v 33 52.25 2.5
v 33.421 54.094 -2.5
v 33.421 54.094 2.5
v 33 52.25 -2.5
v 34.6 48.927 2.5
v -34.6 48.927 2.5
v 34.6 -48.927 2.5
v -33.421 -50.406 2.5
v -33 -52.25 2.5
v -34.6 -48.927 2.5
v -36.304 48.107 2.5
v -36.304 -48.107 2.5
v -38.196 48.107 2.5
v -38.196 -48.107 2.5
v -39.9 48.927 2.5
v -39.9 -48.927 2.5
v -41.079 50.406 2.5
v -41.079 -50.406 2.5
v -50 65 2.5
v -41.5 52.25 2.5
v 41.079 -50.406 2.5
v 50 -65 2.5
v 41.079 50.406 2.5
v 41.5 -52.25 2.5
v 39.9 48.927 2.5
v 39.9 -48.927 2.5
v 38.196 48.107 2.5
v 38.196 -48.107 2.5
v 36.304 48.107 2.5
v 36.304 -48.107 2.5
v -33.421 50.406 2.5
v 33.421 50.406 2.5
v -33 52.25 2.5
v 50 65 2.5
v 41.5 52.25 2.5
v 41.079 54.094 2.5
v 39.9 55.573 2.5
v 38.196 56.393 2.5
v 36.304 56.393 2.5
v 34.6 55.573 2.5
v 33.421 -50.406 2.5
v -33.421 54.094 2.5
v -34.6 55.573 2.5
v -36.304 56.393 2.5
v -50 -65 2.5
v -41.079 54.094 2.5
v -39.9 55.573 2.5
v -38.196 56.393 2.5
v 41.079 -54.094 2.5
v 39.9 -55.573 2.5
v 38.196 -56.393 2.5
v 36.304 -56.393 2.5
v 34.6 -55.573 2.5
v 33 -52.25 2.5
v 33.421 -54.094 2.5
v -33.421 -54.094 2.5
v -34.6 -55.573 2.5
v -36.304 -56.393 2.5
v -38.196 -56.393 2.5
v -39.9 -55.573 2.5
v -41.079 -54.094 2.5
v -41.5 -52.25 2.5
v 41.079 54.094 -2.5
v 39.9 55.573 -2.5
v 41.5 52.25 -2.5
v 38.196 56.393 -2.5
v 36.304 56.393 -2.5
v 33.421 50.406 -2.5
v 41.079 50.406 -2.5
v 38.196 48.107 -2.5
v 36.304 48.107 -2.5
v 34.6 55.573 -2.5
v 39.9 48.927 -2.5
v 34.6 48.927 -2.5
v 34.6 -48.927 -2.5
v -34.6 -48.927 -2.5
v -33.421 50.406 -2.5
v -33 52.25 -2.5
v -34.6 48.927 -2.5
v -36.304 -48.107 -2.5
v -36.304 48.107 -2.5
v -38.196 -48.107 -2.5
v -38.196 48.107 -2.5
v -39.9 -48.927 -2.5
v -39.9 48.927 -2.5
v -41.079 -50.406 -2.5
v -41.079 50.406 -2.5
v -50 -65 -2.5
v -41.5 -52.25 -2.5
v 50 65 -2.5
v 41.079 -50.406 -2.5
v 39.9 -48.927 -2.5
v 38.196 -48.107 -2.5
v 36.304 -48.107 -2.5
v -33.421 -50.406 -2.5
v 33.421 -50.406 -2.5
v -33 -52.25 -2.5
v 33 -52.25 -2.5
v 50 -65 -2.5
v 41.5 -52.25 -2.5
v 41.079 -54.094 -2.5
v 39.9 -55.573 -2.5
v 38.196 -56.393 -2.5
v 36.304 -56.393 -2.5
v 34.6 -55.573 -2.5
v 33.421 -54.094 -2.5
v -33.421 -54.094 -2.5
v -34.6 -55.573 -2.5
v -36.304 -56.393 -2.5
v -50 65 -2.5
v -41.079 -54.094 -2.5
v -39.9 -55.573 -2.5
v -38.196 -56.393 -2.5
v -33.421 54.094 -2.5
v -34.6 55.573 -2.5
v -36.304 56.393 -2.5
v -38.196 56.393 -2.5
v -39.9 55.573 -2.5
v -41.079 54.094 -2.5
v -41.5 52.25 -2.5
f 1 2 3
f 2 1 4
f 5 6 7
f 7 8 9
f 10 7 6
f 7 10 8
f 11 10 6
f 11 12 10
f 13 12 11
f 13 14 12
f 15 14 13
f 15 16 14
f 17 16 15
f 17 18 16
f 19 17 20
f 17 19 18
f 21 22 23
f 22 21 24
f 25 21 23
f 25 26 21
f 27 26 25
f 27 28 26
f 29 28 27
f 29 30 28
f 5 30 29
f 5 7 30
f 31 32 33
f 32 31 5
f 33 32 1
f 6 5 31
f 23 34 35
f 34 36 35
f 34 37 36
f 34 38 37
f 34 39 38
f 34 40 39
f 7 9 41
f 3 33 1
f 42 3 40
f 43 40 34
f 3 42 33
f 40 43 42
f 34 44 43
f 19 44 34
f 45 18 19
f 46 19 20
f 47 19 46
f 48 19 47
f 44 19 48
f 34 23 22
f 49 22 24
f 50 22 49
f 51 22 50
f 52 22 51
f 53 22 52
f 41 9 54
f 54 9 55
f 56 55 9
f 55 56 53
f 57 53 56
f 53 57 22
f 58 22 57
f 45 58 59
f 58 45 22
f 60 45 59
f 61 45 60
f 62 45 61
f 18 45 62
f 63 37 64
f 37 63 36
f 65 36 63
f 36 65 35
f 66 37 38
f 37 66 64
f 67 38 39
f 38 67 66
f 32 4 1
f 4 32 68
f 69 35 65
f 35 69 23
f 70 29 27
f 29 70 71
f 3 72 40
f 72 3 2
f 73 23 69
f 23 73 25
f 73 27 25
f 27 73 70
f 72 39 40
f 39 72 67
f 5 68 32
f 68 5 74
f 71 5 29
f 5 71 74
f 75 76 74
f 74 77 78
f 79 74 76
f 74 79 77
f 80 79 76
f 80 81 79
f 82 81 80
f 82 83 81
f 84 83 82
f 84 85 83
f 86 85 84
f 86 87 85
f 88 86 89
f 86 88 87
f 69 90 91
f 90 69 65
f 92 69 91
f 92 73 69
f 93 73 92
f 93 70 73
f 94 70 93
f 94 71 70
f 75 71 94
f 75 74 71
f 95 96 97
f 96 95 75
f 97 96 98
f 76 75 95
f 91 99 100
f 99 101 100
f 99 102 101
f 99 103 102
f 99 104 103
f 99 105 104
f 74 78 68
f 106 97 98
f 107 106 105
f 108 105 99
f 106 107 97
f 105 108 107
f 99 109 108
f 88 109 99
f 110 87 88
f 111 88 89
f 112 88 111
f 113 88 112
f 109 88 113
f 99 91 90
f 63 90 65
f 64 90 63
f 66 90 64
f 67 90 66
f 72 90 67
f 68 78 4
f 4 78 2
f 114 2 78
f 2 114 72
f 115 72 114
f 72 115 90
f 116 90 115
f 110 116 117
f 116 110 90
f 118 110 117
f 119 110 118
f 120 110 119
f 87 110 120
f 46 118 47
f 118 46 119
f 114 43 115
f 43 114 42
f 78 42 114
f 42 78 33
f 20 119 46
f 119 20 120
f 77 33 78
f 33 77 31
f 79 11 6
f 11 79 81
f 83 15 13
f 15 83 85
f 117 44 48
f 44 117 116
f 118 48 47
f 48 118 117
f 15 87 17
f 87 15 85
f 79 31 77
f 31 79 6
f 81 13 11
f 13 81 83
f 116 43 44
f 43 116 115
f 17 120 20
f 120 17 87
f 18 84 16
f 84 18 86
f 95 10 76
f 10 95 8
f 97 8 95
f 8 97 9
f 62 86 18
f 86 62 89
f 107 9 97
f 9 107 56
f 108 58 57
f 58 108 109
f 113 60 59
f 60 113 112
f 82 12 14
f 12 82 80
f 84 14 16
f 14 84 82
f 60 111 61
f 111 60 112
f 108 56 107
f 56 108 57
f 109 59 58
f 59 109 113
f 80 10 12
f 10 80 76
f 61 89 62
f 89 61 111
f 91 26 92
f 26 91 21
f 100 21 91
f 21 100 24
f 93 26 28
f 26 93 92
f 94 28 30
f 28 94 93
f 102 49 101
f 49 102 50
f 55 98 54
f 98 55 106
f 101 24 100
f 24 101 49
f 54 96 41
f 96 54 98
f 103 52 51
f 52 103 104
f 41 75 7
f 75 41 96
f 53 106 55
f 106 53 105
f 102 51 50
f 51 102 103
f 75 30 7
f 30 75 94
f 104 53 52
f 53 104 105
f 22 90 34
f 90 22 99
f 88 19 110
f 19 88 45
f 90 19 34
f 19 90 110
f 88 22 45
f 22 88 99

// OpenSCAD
// Generated by SolidPython 1.1.3 on 2024-03-13 11:53:13


difference() {
	cube(center = true, size = [100, 130.0000000000, 5]);
	union() {
		translate(v = [37.2500000000, 52.2500000000]) {
			cylinder(center = true, h = 5, r = 4.2500000000);
		}
		translate(v = [-37.2500000000, 52.2500000000]) {
			cylinder(center = true, h = 5, r = 4.2500000000);
		}
		translate(v = [-37.2500000000, -52.2500000000]) {
			cylinder(center = true, h = 5, r = 4.2500000000);
		}
		translate(v = [37.2500000000, -52.2500000000]) {
			cylinder(center = true, h = 5, r = 4.2500000000);
		}
	}
}
/***********************************************
*********      SolidPython code:      **********
************************************************
 
import solid
import numpy as np
import numbers
import pudb
from solid.utils import *
import viewscad
import subprocess
import os
import os.path as osp
import math
import sys

chamfer_extrude=solid.import_scad("./chamfer_extrude.scad")
chamfer_extrude=chamfer_extrude.chamfer_extrude
r = viewscad.Renderer(width=800, height=800)

def debug(model,f_name,path="/home/ts/code/projects/mfd/designs/debug"):
    solid.scad_render_to_file(model,osp.join(path,f_name)+".scad")
#generate position list of wells using offset from center
wells_pos_from_center_4 = lambda offset: [[-offset,offset],
                                        [offset, offset],
                                        [-offset, -offset],
                                        [offset, -offset]]
wells_pos_from_center_2 = lambda offset: [[offset,0],
                                        [-offset,0]]

def make_well(dims,shape=None,height=None,dxf=False):
    def circle_cylinder():
        if dxf or (height is None):
            well = solid.circle(r=dims, segments=64)
        else:
            well = solid.cylinder(r=dims, h=height, segments=64, center = True)
        return well
    if dims is None:
        sys.exit("radius needs to be a number")
    if isinstance(dims, numbers.Number):
        well =circle_cylinder()
    elif len(dims)==1:
        if isinstance(dims[1], numbers.Number):
            well =circle_cylinder()
        else:
            sys.exit("radius needs to be a number")
    elif len(dims)==2:
        well = solid.square(dims,center = True)
    elif len(dims)==3:
        well = solid.cube(dims, center = True)
    return well

def wells_top_bottom(center_gap,device_dims=None,shape=None,height=None, positions = None, dxf = False,well_shape=None):
    if well_shape == None:
        well_shape = make_well(device_dims,shape=shape,height=height,dxf=dxf)
    wells = []
    if positions is None:
        offset = radius+radius/2.0
        positions = wells_pos_from_center_2(offset)
    if dxf or (height is None):
        height = 0
    for position in positions:
        if dxf:
            wells.append(solid.translate([position[0],position[1]])(well_shape))
        else:
            wells.append(solid.translate([position[0],position[1],height/2.0])(well_shape))
    return  union()(*wells)

#place wells in four corners 
def four_corner(radius,height=None, positions = None, dxf = False):
    #if well pos not specified set
    #to equally spaced by half radius
    if positions is None:
        offset = radius+radius/2.0
        positions = wells_pos_from_center_4(offset)
    if dxf or (height is None):
        height = 0
    #make wells at positions with specified radius and height
    wells = []
    for position in positions:
        #make circle if making dxf
        if dxf:
            well_shape = solid.circle(r=radius, segments=64)
            well_shape = solid.translate([position[0],position[1]])(well_shape)
        #if stl make cylinder
        else:
            well_shape = solid.cylinder(r=radius, h=height, segments=64, center = True)
            well_shape = solid.translate([position[0],position[1],height/2.0])(well_shape)
        wells.append(well_shape)
    return  union()(*wells)

#generate channels 
def make_channels(length,width,height=0,num_chans=1,max_chans=None,spacing=None, dxf = False,
                  rotate_channels=False):
    if dxf or (height is None):
        height = 0
    #if channel gap not defined, is equal to
    if spacing is None: spacing = width
    #calculate number of channels if fitting max num within given width
    if not max_chans is None:
        import math
        num_chans = math.floor((max_chans-spacing)/(width+spacing))
    #get total width of channel section  
    total_width = (width*num_chans)+(spacing*(num_chans-1))

    #make template channel
    #if rotate_channels: width, length = length, width
    if dxf:
        channel_t = solid.square([length,width],center = True)
    else:
        channel_t = solid.cube([length,width,height], center = True)

    #if number channels is even, offset the first channel to center its gap
    if num_chans % 2 == 0: centering = -(width/2.0+spacing/2.0)
    else: centering = 0
    #move template channel up to align bottom at z = 0 
    #and offset center if necessary
    if dxf:
        channel_t = solid.translate([0,centering])(channel_t)
    else:
        channel_t = solid.translate([0,centering,height/2.0])(channel_t)

    #if rotate_channels: length,width = width,length
    #start making the channels
    channels = []
    for i in range(num_chans):
        #if i=0 there is no translation
        #if i=1, we make the first channel adjacent to second
        direction = i

        #if i>=1, we add channels alternating left and right
        if i >= 1:
            direction = -(i/2.0)
            if i % 2 == 1: direction = (-direction)+0.5
                
        #make channel at right position and add it to channel list
        translation_coords = [0,direction*(width+spacing)]
        #if rotate_channels: translation_coords = [direction*(width+spacing),0]
        if dxf:
            channel = solid.translate(translation_coords)(channel_t)
        else:
            channel = solid.translate([*translation_coords,0])(channel_t)
        channels.append(channel)
    
    #group all channels as one object
    channels = union()(*channels)
    #compute the x,y,z dimensions in order to pass as arguments 
    #for construction of other parts of device (such as the chambers)
    measurements = {'x':(length/2.0,-length/2.0),
                    'y':(total_width/2.0,-total_width/2.0)}
    if not dxf:
        measurements['z'] = (height,0)
    if rotate_channels:
        channels = solid.rotate(90)(channels)
        measurements['x'],measurements['y']=measurements['y'],measurements['x']
    return channels,measurements

def make_chambers(msrs,height=None,extra=0,len_until=None,width=None, dxf = False):
    #computes x,y,z length
    total = lambda x : abs(x[0]) + abs(x[1])
    
    #if specific height if specified
    #otherwise use same height as channels
    if dxf:
        pass
    elif not height is None:
        msrs['z'] = (height,0)
    else:
        msrs['z'] = (0,0)
        
    #make copy of measurements from channels to modify chamber dimensions 
    #and add length to chambers as specified
    chamber_dims = msrs.copy()
    #calculate length of chamber to reach specified offset
    if not len_until is None:
        chamber_len = len_until-(msrs['x'][0])
    #or add specified length to channel length (if not specified, adds 0)
    else:
        chamber_len = msrs['x'][0]+extra
    #set the chamber length based 
    chamber_dims['x'] = (chamber_len/2.0,-(chamber_len/2.0))
    #compute final dimensions of chamber
    if not width is None:
        chamber_dims['y'] = (width/2.0,-width/2.0)
    chamber_dims = [total(size) for size in chamber_dims.values()]
        
    #calculate chamber translation offset to place adjacent to channels
    chamber_trslt = msrs['x'][0]+(chamber_len/2.0)
    #compute chamber translation coordinates to align with channels
    #x = 1 moves chamber above channels
    #x = -1 moves chamber below channels
    if dxf:
        trslt = lambda x : [x*(chamber_trslt),0]
    else:
        trslt = lambda x : [x*(chamber_trslt),0,msrs['z'][0]/2.0]
    
    #function to make chamber at top or at bottom 
    if dxf:
        move = lambda x : solid.translate(trslt(x))(solid.square(chamber_dims, center = True) )
    else:
        move = lambda x : solid.translate(trslt(x))(solid.cube(chamber_dims,center = True))
    #make top and bottom chambers and return them as grouped
    top = move(1)
    bottom = move(-1)
    #chambers=solid.rotate(90)(solid.union()(top,bottom))
    chambers=(solid.union()(top,bottom))

    return chambers

#create alignment features 
def alignment_features(unit,dims,grid_size, mask_size = None, alignment = "hollow", units_from_center = (2.5,2.5), corner_len=None):
    width = grid_size[0]*dims[0]
    length = grid_size[1]*dims[1]
    if mask_size is None and corner_len is None:
        corner_len = (dims[0] + dims[1]) /2 / 8
    corner = lambda thickness_div : solid.union()( solid.square([corner_len,corner_len/thickness_div],center=False), solid.square([corner_len/thickness_div,corner_len],center=False) )
    
    def make_full(thickness_div):
        thickness = corner_len/thickness_div
        tr = solid.translate([0, 0, 0 ])(solid.rotate(180)(corner(thickness_div)))
        tr = solid.translate([thickness/2,thickness/2,0])(tr)
        bl = solid.translate([0, 0, 0 ])(solid.rotate(0)(corner(thickness_div)))
        bl = solid.translate([-thickness/2,-thickness/2,0])(bl)
        return solid.union()(tr,bl)
    
    def make_hollow(thickness_div):
        thickness = corner_len/(thickness_div/2)
        inner = make_full(thickness_div)
        outer = make_full(thickness_div/2)
        hollow = outer - inner 
        return hollow
    
    center = (width /2 , length/2)
    mask_pos = lambda x,y : (center[0] + x*(float(units_from_center[0])*dims[0]), center[1] + y*(float(units_from_center[1])*dims[1]))
    positions = []
    positions.append(mask_pos(1,0))
    positions.append(mask_pos(0,1))
    positions.append(mask_pos(-1,0))
    positions.append(mask_pos(0,-1))
    make_mask = lambda mtype : make_hollow(8) if mtype == "hollow" else make_full(8)
    masks = [ solid.translate([*position,0])(make_mask(alignment)) for position in positions]
    
    solid.scad_render_to_file(solid.union()(*masks),"./designs/open_chamber/masks.scad")
    #return unit - solid.union()(*masks)
    return solid.union()(*masks,unit)

def create_outline(thickness, array, dims, grid_size,):
    width = grid_size[0]*dims[0] + thickness *2
    length = grid_size[1]*dims[1] + thickness *2
    outer = solid.translate([-thickness, -thickness,0])(solid.square([width, length]))
    return outer-array

def create_wall(wall_thickness, outline_thickness, dims, grid_size, wall_height = 2000, dxf = False):
    inner_width = grid_size[0]*dims[0] + outline_thickness *2
    inner_length = grid_size[1]*dims[1] + outline_thickness *2
    outer_width = inner_width + wall_thickness * 2
    outer_length = inner_length + wall_thickness * 2
    outer_pos_x = -outline_thickness-wall_thickness
    outer_pos_y = -outline_thickness-wall_thickness
    inner_pos_x = -outline_thickness
    inner_pos_y = -outline_thickness
    if dxf:
        inner_wall = solid.translate([inner_pos_x,
                                      inner_pos_y,
                                      0])(solid.square([inner_width, inner_length]))
        outer_wall = solid.translate([outer_pos_x,
                                      outer_pos_y,
                                      0])(solid.square([outer_width, outer_length]))

        return outer_wall-inner_wall
    else:
        inner_wall = solid.translate([inner_pos_x,
                                      inner_pos_y,
                                      0])(solid.cube([inner_width, inner_length,wall_height]))
        outer_wall = solid.translate([outer_pos_x,
                                      outer_pos_y,
                                      0])(solid.cube([outer_width, outer_length,wall_height]))

        return outer_wall-inner_wall, {'wall_height': wall_height,
                                       'wall_thickness': wall_thickness,
                                       'inner_width':inner_width,
                                       'inner_length': inner_length,
                                       'outer_width': outer_width,
                                       'outer_length': outer_length,
                                       'outer_pos_x' : outer_pos_x,
                                       'outer_pos_y' : outer_pos_y,
                                       'inner_pos_x' : inner_pos_x,
                                       'inner_pos_y' : inner_pos_y}

def create_thicker_wall(wall_thickness, outer_wall_offset, wall_dims, dims, grid_size, height_start = .2, height_end=2, dxf = False):
    addon_wall,thicker_wall_dims = create_wall(wall_thickness, outer_wall_offset, dims, grid_size, wall_height=height_end-height_start, dxf = False)
    addon_wall = solid.translate([0,0,height_start])(addon_wall)

    thicker_wall_dims['wall_height'] = height_end
    thicker_wall_dims['wall_thickness'] = wall_dims['wall_thickness'] + wall_thickness
    return addon_wall, thicker_wall_dims
 
def add_lock_to_wall(wall,wall_dims,y_offset = 0,cut_ratio=0.7,L_length=3, gap_ratio=0.05, axis="x",width_ratio=1/2):
    # Makes L shape
    def make_L(max_length,length_thickness,max_width,width_thickness,height,y_offset):
        length = solid.cube([max_length,length_thickness,height])
        width = solid.cube([width_thickness,max_width,height])
        width = solid.translate([max_length-(width_thickness),0,0])(width)
        L = solid.union()(width,length)
        debug(L,"L")
        if axis == "x":
            L = solid.rotate(-90)(L)
            L = solid.translate([0,max_length,0])(L)
        else:
            L = solid.rotate(-180)(L)
            L = solid.translate([max_length,max_width,0])(L)
        return solid.translate([0,0,y_offset])(L)
    
    lock_length = L_length
    lock_width = wall_dims['wall_thickness']*width_ratio
    lock_length_thickness = lock_width/2
    lock_width_thickness = lock_width/2
    L_lock = make_L(lock_length,lock_length_thickness,lock_width,lock_width_thickness, wall_dims['wall_height']-y_offset, y_offset)
    
    margin_space = lock_length - lock_length*(1-gap_ratio)
    key_length = lock_length-margin_space
    key_length_thickness = lock_length_thickness-(margin_space*2)
    key_width = lock_width-(margin_space*2)
    key_width_thickness = lock_width_thickness-(margin_space*2)
    L_key = make_L(key_length,key_length_thickness,key_width,key_width_thickness, wall_dims['wall_height']-y_offset, y_offset)
    L_key = solid.translate([margin_space,margin_space,0])(L_key)
    L = solid.union()(L_lock,L_key)
    debug(L,"L")
    
    #Make cube to be used as negative to split frame in a half
    #Can choose if making left or right negative, specify ratio of split
    def make_negative(right,cut_ratio):
        if axis == "x":
            if right:
                length = wall_dims['outer_length']*(1-cut_ratio)
                pos_x = wall_dims['outer_pos_x']+(wall_dims['outer_length']*cut_ratio)
            else:
                length = wall_dims['outer_length']*(cut_ratio)
                pos_x = wall_dims['outer_pos_x'] 
            negative = solid.cube([wall_dims['outer_width'],length, wall_dims['wall_height']])
            negative = solid.translate([wall_dims['outer_pos_y'],pos_x,0])(negative)
        else:
            if right:
                length = wall_dims['outer_width']*(1-cut_ratio)
                pos_x = wall_dims['outer_pos_y']+(wall_dims['outer_width']*cut_ratio)
            else:
                length = wall_dims['outer_width']*(cut_ratio)
                pos_x = wall_dims['outer_pos_y'] 
            negative = solid.cube([length,wall_dims['outer_length'], wall_dims['wall_height']])
            negative = solid.translate([pos_x,wall_dims['outer_pos_x'],0])(negative)
        return negative, pos_x, length 
                      
    #Make negatives
    negative_right, right_half_pos_x, right_half_length = make_negative(True,cut_ratio)
    negative_left, left_half_pos_x, right_half_length = make_negative(False,cut_ratio)
    #Make halves
    left_half = solid.difference()(wall,negative_right)
    right_half = solid.difference()(wall,negative_left)
    def place_L(L, L_length,L_width):
        #Place L on top wall       
        offset_to_center = (wall_dims['wall_thickness']-L_width)/2
        if axis == "x":
            y_pos_top = (wall_dims['outer_pos_y'] +
                    wall_dims['outer_width'] - 
                    L_width - offset_to_center)
            top_L = solid.translate([y_pos_top,
                                     right_half_pos_x-(L_length),
                                     0])(L)
            #Place L on bottom wall       
            y_pos_bottom = wall_dims['outer_pos_y']+offset_to_center
            bottom_L = solid.translate([y_pos_bottom,
                                        right_half_pos_x-L_length,
                                        0])(L)
        else:
            y_pos_top = (wall_dims['outer_pos_x'] +
                    wall_dims['outer_length'] -
                    (L_width+offset_to_center))
            top_L = solid.translate([right_half_pos_x-L_length,
                                     y_pos_top,
                                     0])(L)
            #Place L on bottom wall       
            y_pos_bottom = wall_dims['outer_pos_y']+offset_to_center
            bottom_L = solid.translate([right_half_pos_x-L_length,
                                        y_pos_bottom,
                                        0])(L)
        return bottom_L, top_L
    #Make complimentary L pieces through union and differences
    #Make Lock
    bottom_L_lock, top_L_lock = place_L(L_lock,L_length,lock_width)
    left_half = solid.difference()(left_half,bottom_L_lock)
    left_half = solid.difference()(left_half,top_L_lock)
    #Make Key
    bottom_L_key, top_L_key = place_L(L_key,L_length,lock_width)
    right_half = solid.union()(right_half,bottom_L_key)
    right_half = solid.union()(right_half,top_L_key)
    return left_half, right_half


#build a row x col grid of containment units
def make_unit_array(unit,dims,grid_size, dxf = False, alignment = None, mask_size = None,
                    units_from_center = None,alignment_offset=None, alignment_mark_size=1):
    units = []
    for col in range(grid_size[1]):
        for row in range(grid_size[0]):
            if dxf:
                units.append(solid.translate([row*dims[0],col*dims[1]])(unit))
            else:
                units.append(solid.translate([row*dims[0],col*dims[1],dims[2]/2.0])(unit))
    array = solid.union()(*units)
    if (not alignment is None) and dxf:
        if not alignment_offset is None:
            array = solid.translate([alignment_offset[0],alignment_offset[1]])(array)
        array = alignment_features(array,dims, grid_size, alignment = alignment, mask_size = None, units_from_center = units_from_center,corner_len=alignment_mark_size)
        if not alignment_offset is None:
            array = solid.translate([-alignment_offset[0],-alignment_offset[1]])(array)
    return array


def make_taylor(wells_pos = wells_pos_from_center_4(2.25), well_rad = 1.5 ,
                well_height = 2, chan_w = 0.01, chan_l = 1, chan_h = 0.010 ,
                chan_gap = 0.040, max_chans = None,num_chans=100, chamber_height  = 0.100,
                columns = 1, rows = 1, chamber_len_until=2.25, add_channels = True, add_wells = True, 
                add_chambers = True, save_path = "./", alignment = None, units_from_center = 2,
                mask_size = None, render_stl = False, outline_thickness = 0.050, dxf = True,
                wall_height = 15, wall_thickness = 0.95, casing_x=9, casing_y=9, casing_z=0,rotate_units=0):

    dims = [casing_x, casing_y, casing_z]
    wells = four_corner(well_rad,well_height, dxf = dxf, positions = wells_pos)
    debug(wells,"wells")
    channels, msrs = make_channels(chan_l,chan_w,chan_h,dxf=dxf, spacing = chan_gap, max_chans=max_chans,num_chans=num_chans)
    debug(channels,"channels")
    chambers = make_chambers(msrs,dxf = dxf, height=chamber_height,len_until=chamber_len_until)
    debug(chambers,"chambers")

    #add together and render
    device_parts = []
    if add_channels:
        device_parts.append(channels)
    if add_wells:
        device_parts.append(wells)
    if add_chambers:
        device_parts.append(chambers)
    device=union()(*device_parts)
    device = rotate(rotate_units)(device)

    device=solid.translate([dims[0]/2.0,dims[1]/2.0,0])(device)
    channels = rotate(rotate_units)(channels)
    channels=solid.translate([dims[0]/2,dims[1]/2,0])(channels)
    chambers_wells = union()(wells,chambers)
    chambers_wells = rotate(rotate_units)(chambers_wells)
    chambers_wells=solid.translate([dims[0]/2,dims[1]/2,0])(chambers_wells)

    file_name = str(rows)+'x'+str(columns)+'_units_'
    grid_size = [rows,columns]

    if alignment:
        alignment="full"
    device = make_unit_array(device,dims,grid_size, dxf=dxf, alignment = alignment,
                                 units_from_center = units_from_center)
    channels = make_unit_array(channels,dims,grid_size, dxf=dxf, alignment = alignment,
                                 units_from_center = units_from_center)
    if alignment=="full":
        alignment="hollow"

    chambers_wells = make_unit_array(chambers_wells,dims,grid_size, dxf=dxf, alignment = alignment,
                                 units_from_center =units_from_center)

    def save_model(model,prefix):
        model_fname = os.path.abspath(save_path+prefix+"_"+file_name+".scad")
        solid.scad_render_to_file(model,model_fname)
        return model_fname

    wells_fname = save_model(wells,"wells")
    channels_fname = save_model(channels,"channels")
    device_fname = save_model(device,"device")
    chambers_wells_fname = save_model(chambers_wells,"chambers_wells")
    return (chambers_wells,chambers_wells_fname), (channels,channels_fname), (device,device_fname)

def make_device(design='open',rows=8,columns=6,wells_pos = 4.5,well_offset=3.2, well_rad=3.2,well_height=0.1,
                chan_l=1,chan_w=0.01,chan_h=0.01,chan_gap=0.015,num_chans=101,dxf=True,save_path="./designs/open_chamber/",
                casing_x=9.0,casing_y=18.0,casing_z=0,rotate_units=90,units_from_center=(3,1),chamber_len_until=4.5,
                chamber_width=None,alignment=True, add_wells=True, add_channels=True,add_chambers=True,well_shape=None):

    dims = [casing_x, casing_y, casing_z]
    if design == "open":
        wells_pos=wells_pos_from_center_2(wells_pos)
        wells = wells_top_bottom(well_offset*2,device_dims=well_rad,height=well_height, dxf = dxf, positions = wells_pos,well_shape=well_shape)
    elif design == "closed":
        wells_pos=wells_pos_from_center_4(wells_pos)
        debug(wells,"wells")
        wells = four_corner(well_offset,well_height,device_dims=well_rad, dxf = dxf, positions = wells_pos)
    else:
        print(design+" is not a valid design.\n Choose valid design: 'open' or 'closed'")
        exit()
    wells = rotate(rotate_units)(wells)
    wells=solid.translate([dims[0]/2,dims[1]/2,0])(wells)
    debug(wells,"wells")

    channels, msrs = make_channels(chan_l,chan_w,chan_h,dxf=dxf, spacing = chan_gap, num_chans=num_chans,rotate_channels=False)
    channels = rotate(rotate_units)(channels)
    channels=solid.translate([dims[0]/2,dims[1]/2,0])(channels)

    chambers=make_chambers(msrs,height=None,extra=0,len_until=chamber_len_until, width=chamber_width,dxf = dxf)
    chambers = rotate(rotate_units)(chambers)
    chambers=solid.translate([dims[0]/2,dims[1]/2,0])(chambers)

    device_parts = []
    if add_channels:
        device_parts.append(channels)
    if add_wells:
        device_parts.append(wells)
    if add_chambers:
        device_parts.append(chambers)
    device = union()(*device_parts)
    #device = rotate(rotate_units)(device)
    #device=solid.translate([dims[0]/2.0,dims[1]/2.0,0])(device)

    chambers_wells = []
    if add_chambers:
        chambers_wells.append(chambers)
    if add_wells:
        chambers_wells.append(wells)
    chambers_wells = union()(*chambers_wells)
    #chambers_wells = union()(wells,chambers)
    #chambers_wells = rotate(rotate_units)(chambers_wells)
    #chambers_wells=solid.translate([dims[0]/2,dims[1]/2,0])(chambers_wells)

    file_name = str(rows)+'x'+str(columns)+'_units_'

    grid_size = [rows,columns]
    if alignment:
        alignment="full"
    device = make_unit_array(device,dims,grid_size, dxf=dxf, alignment = alignment,
                                 units_from_center = units_from_center)
    channels = make_unit_array(channels,dims,grid_size, dxf=dxf, alignment = alignment,
                                 units_from_center = units_from_center)
    if alignment=="full":
        alignment="hollow"

    chambers_wells = make_unit_array(chambers_wells,dims,grid_size, dxf=dxf, alignment = alignment,
                                 units_from_center =units_from_center)

    def save_model(model,prefix):
        model_fname = os.path.abspath(save_path+prefix+"_"+file_name+".scad")
        solid.scad_render_to_file(model,model_fname)
        return model_fname

    wells_fname = save_model(wells,"wells")
    channels_fname = save_model(channels,"channels")
    device_fname = save_model(device,"device")
    chambers_wells_fname = save_model(chambers_wells,"chambers_wells")
    return (chambers_wells,chambers_wells_fname), (channels,channels_fname), (device,device_fname)


def make_open_chamber(rows=8,columns=6,wells_pos = wells_pos_from_center_2(4.5), well_rad=3.2,well_height=0.1,
                      chan_l=1,chan_w=0.01,chan_h=0.01,chan_gap=0.015,num_chans=101,dxf=True,save_path="./designs/open_chamber/",
                      casing_x=9.0,casing_y=18.0,casing_z=0,rotate_units=90,units_from_center=(3,1),chamber_len_until=4.5,
                      chamber_width=None,alignment=True, add_wells=True, add_channels=True,add_chambers=True,well_shape=None):

    dims = [casing_x, casing_y, casing_z]
    wells = wells_top_bottom(well_rad,height=well_height, dxf = dxf, positions = wells_pos, well_shape=well_shape)
    channels, msrs = make_channels(chan_l,chan_w,chan_h,dxf=dxf, spacing = chan_gap, num_chans=num_chans,rotate_channels=False)
    chambers=make_chambers(msrs,height=None,extra=0,len_until=chamber_len_until, width=chamber_width,dxf = dxf)
    debug(chambers,"chambers")
    device_parts = []
    if add_channels:
        device_parts.append(channels)
    if add_wells:
        device_parts.append(wells)
    if add_chambers:
        device_parts.append(chambers)
    device = union()(*device_parts)
    device = rotate(rotate_units)(device)
    device=solid.translate([dims[0]/2.0,dims[1]/2.0,0])(device)
    channels = rotate(rotate_units)(channels)
    channels=solid.translate([dims[0]/2,dims[1]/2,0])(channels)
    chambers_wells = union()(wells,chambers)
    chambers_wells = rotate(rotate_units)(chambers_wells)
    chambers_wells=solid.translate([dims[0]/2,dims[1]/2,0])(chambers_wells)

    file_name = str(rows)+'x'+str(columns)+'_units_'

    grid_size = [rows,columns]
    if alignment:
        alignment="full"
    device = make_unit_array(device,dims,grid_size, dxf=dxf, alignment = alignment,
                                 units_from_center = units_from_center)
    channels = make_unit_array(channels,dims,grid_size, dxf=dxf, alignment = alignment,
                                 units_from_center = units_from_center)
    if alignment=="full":
        alignment="hollow"

    chambers_wells = make_unit_array(chambers_wells,dims,grid_size, dxf=dxf, alignment = alignment,
                                 units_from_center =units_from_center)

    def save_model(model,prefix):
        model_fname = os.path.abspath(save_path+prefix+"_"+file_name+".scad")
        solid.scad_render_to_file(model,model_fname)
        return model_fname

    wells_fname = save_model(wells,"wells")
    channels_fname = save_model(channels,"channels")
    device_fname = save_model(device,"device")
    chambers_wells_fname = save_model(chambers_wells,"chambers_wells")
    return (chambers_wells,chambers_wells_fname), (channels,channels_fname), (device,device_fname)

def to_dxf(scad_path):
    dxf_path = scad_path.replace(".scad",".dxf")
    subprocess.call(["openscad", "-o", dxf_path, scad_path])
    import ezdxf
    temp_dxf = ezdxf.readfile(dxf_path)
    temp_dxf.saveas(dxf_path)

#def make_walls(diameter,thickness,grid_size,dims,height=20,segments=256,make_inner=True):
#    wafer_wall_out = solid.cylinder(r=diameter/2,h=height, segments=segments)
#    wafer_wall_in = solid.cylinder(r=(diameter/2-thickness),h=height, segments=segments)
#    wafer_wall = solid.difference()(wafer_wall_out,wafer_wall_in)
#    wafer_wall = solid.translate([grid_size[1]*dims[1]/2.0,grid_size[0]*dims[0]/2.0])(wafer_wall)
#
#    vertical_wall_length = grid_size[1]*dims[1]
#    horizontal_wall_length = grid_size[0]*dims[0]
#    vertical_wall = solid.cube([vertical_wall_length,thickness,height],center = True)
#    vertical_wall = solid.translate([vertical_wall_length/2,0,height/2])(vertical_wall)
#    horizontal_wall = solid.cube([thickness,horizontal_wall_length,height],center = True)
#    horizontal_wall = solid.translate([0,vertical_wall_length/2,height/2])(horizontal_wall)
#    walls = []
#    walls.append(horizontal_wall)
#    walls.append(vertical_wall)
#    for col in range(grid_size[1]):
#        if col == grid_size[1]-1: 
#            walls.append(solid.translate([0,(col+1)*dims[1]])(vertical_wall))
#        elif col > 0 and col < grid_size[1]-1 and make_inner==True:
#            walls.append(solid.translate([0,(col+1)*dims[1]])(vertical_wall))
#    for row in range(grid_size[0]):
#        if row == grid_size[0]-1: 
#            walls.append(solid.translate([(row+1)*dims[0],0])(horizontal_wall))
#        elif row > 0 and row < grid_size[0]-1 and make_inner==True:
#            walls.append(solid.translate([(row+1)*dims[0],0])(horizontal_wall))
#    walls = union()(*walls)
#    wafer_walls = union()(walls,wafer_wall)
#    return walls,wafer_wall,wafer_walls

def make_walls(diameter,thickness,grid_size,dims,height=20,segments=256,make_inner=True,padx=0,pady=0):
    wafer_wall_out = solid.cylinder(r=diameter/2,h=height, segments=segments)
    wafer_wall_in = solid.cylinder(r=(diameter/2-thickness),h=height, segments=segments)
    wafer_wall = solid.difference()(wafer_wall_out,wafer_wall_in)
    wafer_wall = solid.translate([grid_size[1]*dims[1]/2.0,grid_size[0]*dims[0]/2.0])(wafer_wall)

    vertical_wall_length = grid_size[0]*dims[0]+padx
    horizontal_wall_length = grid_size[1]*dims[1]+pady
    vertical_wall = solid.cube([vertical_wall_length,thickness,height],center = True)
    vertical_wall = solid.translate([vertical_wall_length/2-pady/2,-padx/2,height/2])(vertical_wall)
    horizontal_wall = solid.cube([thickness,horizontal_wall_length,height],center = True)
    horizontal_wall = solid.translate([-pady/2,horizontal_wall_length/2-padx/2,height/2])(horizontal_wall)
    walls = []
    walls.append(horizontal_wall)
    walls.append(vertical_wall)
    for col in range(grid_size[1]):
        if col == grid_size[1]-1: 
            walls.append(solid.translate([0,(col+1)*dims[1]+pady])(vertical_wall))
        elif col > 0 and col < grid_size[1]-1 and make_inner==True:
            walls.append(solid.translate([0,(col+1)*dims[1]])(vertical_wall))
    for row in range(grid_size[0]):
        if row == grid_size[0]-1: 
            walls.append(solid.translate([(row+1)*dims[0]+padx,0])(horizontal_wall))
        elif row > 0 and row < grid_size[0]-1 and make_inner==True:
            walls.append(solid.translate([(row+1)*dims[0],0])(horizontal_wall))
    walls = union()(*walls)
    wafer_walls = union()(walls,wafer_wall)
    return walls,wafer_wall,wafer_walls

def save_model(model,base_path,base_name,dxf=True):
    if not os.path.exists(base_path):
        os.makedirs(base_path)
    dxf_path=osp.join(base_path,base_name+".scad")
    solid.scad_render_to_file(model,osp.join(dxf_path))
    if dxf:
        to_dxf(dxf_path)

def make_wafer(diameter,flat_len,thickness):
    wafer = solid.cylinder(r1=diameter/2,r2=diameter/2,h=thickness,segments=512,)()
    x_start_flat=(flat_len/2)
    y_start_flat = math.sqrt(((diameter/2)**2) - (x_start_flat**2) )
    height_delete_flat=diameter/2-y_start_flat
    flat_delete = solid.cube([flat_len,height_delete_flat,thickness],center=False)()
    flat_delete = solid.translate([-flat_len/2,y_start_flat,0])(flat_delete)
    wafer = solid.difference()(wafer,flat_delete)
    wafer = solid.rotate(90)(wafer)
    return wafer

def add_wafer_to_mask(wafer_size,flat_len,mask,grid_size,dims,wafer_line_thickness=0.1,outer_mask_thickness=5,alignment_offset=None):
    def make_wafer_mask(wafer_size,flat_len):
        wafer_mask = make_wafer(wafer_size,flat_len,1)
        wafer_mask = solid.projection()(wafer_mask)
        wafer_mask = solid.translate([grid_size[0]*dims[0]/2.0,grid_size[1]*dims[1]/2.0])(wafer_mask)
        if not alignment_offset is None:
            wafer_mask = solid.translate([-alignment_offset[0],-alignment_offset[1]])(wafer_mask)
        return wafer_mask

    inner_wafer_line_mask = make_wafer_mask(wafer_size-wafer_line_thickness/2,flat_len)
    outer_wafer_line_mask = make_wafer_mask(wafer_size+wafer_line_thickness/2,flat_len)
    outer_wafer_mask = make_wafer_mask(wafer_size+outer_mask_thickness,flat_len)
    outer_wafer_mask = solid.difference()(outer_wafer_mask,outer_wafer_line_mask)
    wafer_mask = solid.union()(outer_wafer_mask,inner_wafer_line_mask)

    return solid.difference()(wafer_mask,mask)

def make_posts(post_shape,post_height):
    posts = solid.linear_extrude(height=post_height)(post_shape)
    return posts

def make_wafer_empty(diameter,flat_len,thickness,margin,notch_len=20,notch_height=5,oversize=1.01):
    diameter*=oversize
    flat_len*=oversize
    wafer = make_wafer(diameter,flat_len,thickness)
    holder = solid.cylinder(r1=diameter/2+margin,r2=diameter/2+margin,h=thickness,segments=512)()
    holder = solid.difference()(holder,wafer)

    x_start_flat=(flat_len/2)
    y_start_flat = math.sqrt(((diameter/2)**2) - (x_start_flat**2) )
    height_delete_flat=diameter/2-y_start_flat
    notch = solid.cube([notch_len,notch_height,thickness],center=False)()
    notch = solid.translate([-notch_len/2,y_start_flat,0])(notch)
    notch = solid.rotate(90)(notch)
    return solid.difference()(holder,notch)

def wafer_print_calibration(diameter,thickness,height,z_offset):
    circles = []
    radii = []
    radii.append(diameter/2.0*0.8)
    radii.append(diameter/2.0*0.6)
    radii.append(diameter/2.0*0.4)
    radii.append(diameter/2.0*0.2)
    for radius in radii:
        inner = solid.cylinder(r1=radius-(thickness/2.0),r2=radius-(thickness/2.0),h=thickness,segments=512,)()
        outer = solid.cylinder(r1=radius+(thickness/2.0),r2=radius+(thickness/2.0),h=thickness,segments=512,)()
        diff = solid.difference()(outer,inner)
        circles.append(diff)
    circles = solid.union()(*circles)
    circles = solid.translate([0,0,z_offset])(circles)
    return circles

def make_rack(wells,dims,grid_size,alignment_offset,rack_x,rack_y,rack_thickness,bolt_width,add_bolts=True):

    #get X and Y dimensions of gride of pipette tips
    X_len = dims[0]*grid_size[0]
    Y_len = dims[1]*grid_size[1]
    #make rack
    rack = solid.cube([rack_x,rack_y,rack_thickness],center=True)

    if add_bolts:
    #add bolt holes
        bolt_hole=solid.cylinder(r=bolt_width/2,h=rack_thickness,center=True)()
        bolt_holes = []
        bolt_holes.append(solid.translate([rack_x/2-1.5*bolt_width,rack_y/2-1.5*bolt_width])(bolt_hole))
        bolt_holes.append(solid.translate([-rack_x/2+1.5*bolt_width,rack_y/2-1.5*bolt_width])(bolt_hole))
        bolt_holes.append(solid.translate([-rack_x/2+1.5*bolt_width,-rack_y/2+1.5*bolt_width])(bolt_hole))
        bolt_holes.append(solid.translate([rack_x/2-1.5*bolt_width,-rack_y/2+1.5*bolt_width])(bolt_hole))
        bolt_holes = solid.union()(*bolt_holes)
        rack=solid.difference()(rack,bolt_holes)
    rack_support = rack

    #center rack with pipette holes
    rack = solid.translate([0,0,rack_thickness/2])(rack)
    rack = solid.translate([X_len/2,Y_len/2])(rack)
    rack = solid.translate([-alignment_offset[0],-alignment_offset[1]])(rack)
    wells = solid.linear_extrude(height=rack_thickness)(wells)
    rack = solid.difference()(rack,wells)
    return rack, rack_support

def make_pillar(wells,dims,grid_size,alignment_offset,rack_x,rack_y,pillar_height,rack_thickness,bolt_width,add_bolts=True,taper_angle=1,bolt_position_corner=1.5):

    #get X and Y dimensions of gride of pipette tips
    X_len = dims[0]*grid_size[0]
    Y_len = dims[1]*grid_size[1]
    #make rack
    rack = solid.cube([rack_x,rack_y,rack_thickness],center=True)
    
    if add_bolts:
    #add bolt holes
        bolt_hole=solid.cylinder(r=bolt_width/2,h=rack_thickness,center=True)()
        bolt_holes = []
        bolt_holes.append(solid.translate([rack_x/2-bolt_position_corner*bolt_width,rack_y/2-bolt_position_corner*bolt_width])(bolt_hole))
        bolt_holes.append(solid.translate([-rack_x/2+bolt_position_corner*bolt_width,rack_y/2-bolt_position_corner*bolt_width])(bolt_hole))
        bolt_holes.append(solid.translate([-rack_x/2+bolt_position_corner*bolt_width,-rack_y/2+bolt_position_corner*bolt_width])(bolt_hole))
        bolt_holes.append(solid.translate([rack_x/2-bolt_position_corner*bolt_width,-rack_y/2+bolt_position_corner*bolt_width])(bolt_hole))
        bolt_holes = solid.union()(*bolt_holes)
        rack=solid.difference()(rack,bolt_holes)
    rack_support = rack

    #center rack with pipette holes
    #rack = solid.translate([0,0,-rack_thickness])(rack)
    rack = solid.translate([X_len/2,Y_len/2])(rack)
    rack = solid.translate([-alignment_offset[0],-alignment_offset[1]])(rack)
    if not taper_angle == 0:
        wells=chamfer_extrude(pillar_height,taper_angle,segments=20)(wells)
    else:
        wells = solid.linear_extrude(height=pillar_height)(wells)
    rack = solid.union()(rack,wells)
    return rack, rack_support

def deg_taper_len(height,deg):
    if not deg == 0:
        return height*math.tan(math.radians(deg))
    else:
        return 0

def make_outline(inner_dims,wall_thickness,grid_size,dims,alignment_offset):
    inner_dims=np.array(inner_dims)
    inner_outline=solid.square(inner_dims,center=True)
    outer_dims=inner_dims+wall_thickness
    outer_outline=solid.square(outer_dims,center=True)
    outline=solid.difference()(outer_outline,inner_outline)
    outline=solid.translate([grid_size[0]*dims[0]/2.0,grid_size[1]*dims[1]/2.0])(outline)
    return outline








 
 
************************************************/
